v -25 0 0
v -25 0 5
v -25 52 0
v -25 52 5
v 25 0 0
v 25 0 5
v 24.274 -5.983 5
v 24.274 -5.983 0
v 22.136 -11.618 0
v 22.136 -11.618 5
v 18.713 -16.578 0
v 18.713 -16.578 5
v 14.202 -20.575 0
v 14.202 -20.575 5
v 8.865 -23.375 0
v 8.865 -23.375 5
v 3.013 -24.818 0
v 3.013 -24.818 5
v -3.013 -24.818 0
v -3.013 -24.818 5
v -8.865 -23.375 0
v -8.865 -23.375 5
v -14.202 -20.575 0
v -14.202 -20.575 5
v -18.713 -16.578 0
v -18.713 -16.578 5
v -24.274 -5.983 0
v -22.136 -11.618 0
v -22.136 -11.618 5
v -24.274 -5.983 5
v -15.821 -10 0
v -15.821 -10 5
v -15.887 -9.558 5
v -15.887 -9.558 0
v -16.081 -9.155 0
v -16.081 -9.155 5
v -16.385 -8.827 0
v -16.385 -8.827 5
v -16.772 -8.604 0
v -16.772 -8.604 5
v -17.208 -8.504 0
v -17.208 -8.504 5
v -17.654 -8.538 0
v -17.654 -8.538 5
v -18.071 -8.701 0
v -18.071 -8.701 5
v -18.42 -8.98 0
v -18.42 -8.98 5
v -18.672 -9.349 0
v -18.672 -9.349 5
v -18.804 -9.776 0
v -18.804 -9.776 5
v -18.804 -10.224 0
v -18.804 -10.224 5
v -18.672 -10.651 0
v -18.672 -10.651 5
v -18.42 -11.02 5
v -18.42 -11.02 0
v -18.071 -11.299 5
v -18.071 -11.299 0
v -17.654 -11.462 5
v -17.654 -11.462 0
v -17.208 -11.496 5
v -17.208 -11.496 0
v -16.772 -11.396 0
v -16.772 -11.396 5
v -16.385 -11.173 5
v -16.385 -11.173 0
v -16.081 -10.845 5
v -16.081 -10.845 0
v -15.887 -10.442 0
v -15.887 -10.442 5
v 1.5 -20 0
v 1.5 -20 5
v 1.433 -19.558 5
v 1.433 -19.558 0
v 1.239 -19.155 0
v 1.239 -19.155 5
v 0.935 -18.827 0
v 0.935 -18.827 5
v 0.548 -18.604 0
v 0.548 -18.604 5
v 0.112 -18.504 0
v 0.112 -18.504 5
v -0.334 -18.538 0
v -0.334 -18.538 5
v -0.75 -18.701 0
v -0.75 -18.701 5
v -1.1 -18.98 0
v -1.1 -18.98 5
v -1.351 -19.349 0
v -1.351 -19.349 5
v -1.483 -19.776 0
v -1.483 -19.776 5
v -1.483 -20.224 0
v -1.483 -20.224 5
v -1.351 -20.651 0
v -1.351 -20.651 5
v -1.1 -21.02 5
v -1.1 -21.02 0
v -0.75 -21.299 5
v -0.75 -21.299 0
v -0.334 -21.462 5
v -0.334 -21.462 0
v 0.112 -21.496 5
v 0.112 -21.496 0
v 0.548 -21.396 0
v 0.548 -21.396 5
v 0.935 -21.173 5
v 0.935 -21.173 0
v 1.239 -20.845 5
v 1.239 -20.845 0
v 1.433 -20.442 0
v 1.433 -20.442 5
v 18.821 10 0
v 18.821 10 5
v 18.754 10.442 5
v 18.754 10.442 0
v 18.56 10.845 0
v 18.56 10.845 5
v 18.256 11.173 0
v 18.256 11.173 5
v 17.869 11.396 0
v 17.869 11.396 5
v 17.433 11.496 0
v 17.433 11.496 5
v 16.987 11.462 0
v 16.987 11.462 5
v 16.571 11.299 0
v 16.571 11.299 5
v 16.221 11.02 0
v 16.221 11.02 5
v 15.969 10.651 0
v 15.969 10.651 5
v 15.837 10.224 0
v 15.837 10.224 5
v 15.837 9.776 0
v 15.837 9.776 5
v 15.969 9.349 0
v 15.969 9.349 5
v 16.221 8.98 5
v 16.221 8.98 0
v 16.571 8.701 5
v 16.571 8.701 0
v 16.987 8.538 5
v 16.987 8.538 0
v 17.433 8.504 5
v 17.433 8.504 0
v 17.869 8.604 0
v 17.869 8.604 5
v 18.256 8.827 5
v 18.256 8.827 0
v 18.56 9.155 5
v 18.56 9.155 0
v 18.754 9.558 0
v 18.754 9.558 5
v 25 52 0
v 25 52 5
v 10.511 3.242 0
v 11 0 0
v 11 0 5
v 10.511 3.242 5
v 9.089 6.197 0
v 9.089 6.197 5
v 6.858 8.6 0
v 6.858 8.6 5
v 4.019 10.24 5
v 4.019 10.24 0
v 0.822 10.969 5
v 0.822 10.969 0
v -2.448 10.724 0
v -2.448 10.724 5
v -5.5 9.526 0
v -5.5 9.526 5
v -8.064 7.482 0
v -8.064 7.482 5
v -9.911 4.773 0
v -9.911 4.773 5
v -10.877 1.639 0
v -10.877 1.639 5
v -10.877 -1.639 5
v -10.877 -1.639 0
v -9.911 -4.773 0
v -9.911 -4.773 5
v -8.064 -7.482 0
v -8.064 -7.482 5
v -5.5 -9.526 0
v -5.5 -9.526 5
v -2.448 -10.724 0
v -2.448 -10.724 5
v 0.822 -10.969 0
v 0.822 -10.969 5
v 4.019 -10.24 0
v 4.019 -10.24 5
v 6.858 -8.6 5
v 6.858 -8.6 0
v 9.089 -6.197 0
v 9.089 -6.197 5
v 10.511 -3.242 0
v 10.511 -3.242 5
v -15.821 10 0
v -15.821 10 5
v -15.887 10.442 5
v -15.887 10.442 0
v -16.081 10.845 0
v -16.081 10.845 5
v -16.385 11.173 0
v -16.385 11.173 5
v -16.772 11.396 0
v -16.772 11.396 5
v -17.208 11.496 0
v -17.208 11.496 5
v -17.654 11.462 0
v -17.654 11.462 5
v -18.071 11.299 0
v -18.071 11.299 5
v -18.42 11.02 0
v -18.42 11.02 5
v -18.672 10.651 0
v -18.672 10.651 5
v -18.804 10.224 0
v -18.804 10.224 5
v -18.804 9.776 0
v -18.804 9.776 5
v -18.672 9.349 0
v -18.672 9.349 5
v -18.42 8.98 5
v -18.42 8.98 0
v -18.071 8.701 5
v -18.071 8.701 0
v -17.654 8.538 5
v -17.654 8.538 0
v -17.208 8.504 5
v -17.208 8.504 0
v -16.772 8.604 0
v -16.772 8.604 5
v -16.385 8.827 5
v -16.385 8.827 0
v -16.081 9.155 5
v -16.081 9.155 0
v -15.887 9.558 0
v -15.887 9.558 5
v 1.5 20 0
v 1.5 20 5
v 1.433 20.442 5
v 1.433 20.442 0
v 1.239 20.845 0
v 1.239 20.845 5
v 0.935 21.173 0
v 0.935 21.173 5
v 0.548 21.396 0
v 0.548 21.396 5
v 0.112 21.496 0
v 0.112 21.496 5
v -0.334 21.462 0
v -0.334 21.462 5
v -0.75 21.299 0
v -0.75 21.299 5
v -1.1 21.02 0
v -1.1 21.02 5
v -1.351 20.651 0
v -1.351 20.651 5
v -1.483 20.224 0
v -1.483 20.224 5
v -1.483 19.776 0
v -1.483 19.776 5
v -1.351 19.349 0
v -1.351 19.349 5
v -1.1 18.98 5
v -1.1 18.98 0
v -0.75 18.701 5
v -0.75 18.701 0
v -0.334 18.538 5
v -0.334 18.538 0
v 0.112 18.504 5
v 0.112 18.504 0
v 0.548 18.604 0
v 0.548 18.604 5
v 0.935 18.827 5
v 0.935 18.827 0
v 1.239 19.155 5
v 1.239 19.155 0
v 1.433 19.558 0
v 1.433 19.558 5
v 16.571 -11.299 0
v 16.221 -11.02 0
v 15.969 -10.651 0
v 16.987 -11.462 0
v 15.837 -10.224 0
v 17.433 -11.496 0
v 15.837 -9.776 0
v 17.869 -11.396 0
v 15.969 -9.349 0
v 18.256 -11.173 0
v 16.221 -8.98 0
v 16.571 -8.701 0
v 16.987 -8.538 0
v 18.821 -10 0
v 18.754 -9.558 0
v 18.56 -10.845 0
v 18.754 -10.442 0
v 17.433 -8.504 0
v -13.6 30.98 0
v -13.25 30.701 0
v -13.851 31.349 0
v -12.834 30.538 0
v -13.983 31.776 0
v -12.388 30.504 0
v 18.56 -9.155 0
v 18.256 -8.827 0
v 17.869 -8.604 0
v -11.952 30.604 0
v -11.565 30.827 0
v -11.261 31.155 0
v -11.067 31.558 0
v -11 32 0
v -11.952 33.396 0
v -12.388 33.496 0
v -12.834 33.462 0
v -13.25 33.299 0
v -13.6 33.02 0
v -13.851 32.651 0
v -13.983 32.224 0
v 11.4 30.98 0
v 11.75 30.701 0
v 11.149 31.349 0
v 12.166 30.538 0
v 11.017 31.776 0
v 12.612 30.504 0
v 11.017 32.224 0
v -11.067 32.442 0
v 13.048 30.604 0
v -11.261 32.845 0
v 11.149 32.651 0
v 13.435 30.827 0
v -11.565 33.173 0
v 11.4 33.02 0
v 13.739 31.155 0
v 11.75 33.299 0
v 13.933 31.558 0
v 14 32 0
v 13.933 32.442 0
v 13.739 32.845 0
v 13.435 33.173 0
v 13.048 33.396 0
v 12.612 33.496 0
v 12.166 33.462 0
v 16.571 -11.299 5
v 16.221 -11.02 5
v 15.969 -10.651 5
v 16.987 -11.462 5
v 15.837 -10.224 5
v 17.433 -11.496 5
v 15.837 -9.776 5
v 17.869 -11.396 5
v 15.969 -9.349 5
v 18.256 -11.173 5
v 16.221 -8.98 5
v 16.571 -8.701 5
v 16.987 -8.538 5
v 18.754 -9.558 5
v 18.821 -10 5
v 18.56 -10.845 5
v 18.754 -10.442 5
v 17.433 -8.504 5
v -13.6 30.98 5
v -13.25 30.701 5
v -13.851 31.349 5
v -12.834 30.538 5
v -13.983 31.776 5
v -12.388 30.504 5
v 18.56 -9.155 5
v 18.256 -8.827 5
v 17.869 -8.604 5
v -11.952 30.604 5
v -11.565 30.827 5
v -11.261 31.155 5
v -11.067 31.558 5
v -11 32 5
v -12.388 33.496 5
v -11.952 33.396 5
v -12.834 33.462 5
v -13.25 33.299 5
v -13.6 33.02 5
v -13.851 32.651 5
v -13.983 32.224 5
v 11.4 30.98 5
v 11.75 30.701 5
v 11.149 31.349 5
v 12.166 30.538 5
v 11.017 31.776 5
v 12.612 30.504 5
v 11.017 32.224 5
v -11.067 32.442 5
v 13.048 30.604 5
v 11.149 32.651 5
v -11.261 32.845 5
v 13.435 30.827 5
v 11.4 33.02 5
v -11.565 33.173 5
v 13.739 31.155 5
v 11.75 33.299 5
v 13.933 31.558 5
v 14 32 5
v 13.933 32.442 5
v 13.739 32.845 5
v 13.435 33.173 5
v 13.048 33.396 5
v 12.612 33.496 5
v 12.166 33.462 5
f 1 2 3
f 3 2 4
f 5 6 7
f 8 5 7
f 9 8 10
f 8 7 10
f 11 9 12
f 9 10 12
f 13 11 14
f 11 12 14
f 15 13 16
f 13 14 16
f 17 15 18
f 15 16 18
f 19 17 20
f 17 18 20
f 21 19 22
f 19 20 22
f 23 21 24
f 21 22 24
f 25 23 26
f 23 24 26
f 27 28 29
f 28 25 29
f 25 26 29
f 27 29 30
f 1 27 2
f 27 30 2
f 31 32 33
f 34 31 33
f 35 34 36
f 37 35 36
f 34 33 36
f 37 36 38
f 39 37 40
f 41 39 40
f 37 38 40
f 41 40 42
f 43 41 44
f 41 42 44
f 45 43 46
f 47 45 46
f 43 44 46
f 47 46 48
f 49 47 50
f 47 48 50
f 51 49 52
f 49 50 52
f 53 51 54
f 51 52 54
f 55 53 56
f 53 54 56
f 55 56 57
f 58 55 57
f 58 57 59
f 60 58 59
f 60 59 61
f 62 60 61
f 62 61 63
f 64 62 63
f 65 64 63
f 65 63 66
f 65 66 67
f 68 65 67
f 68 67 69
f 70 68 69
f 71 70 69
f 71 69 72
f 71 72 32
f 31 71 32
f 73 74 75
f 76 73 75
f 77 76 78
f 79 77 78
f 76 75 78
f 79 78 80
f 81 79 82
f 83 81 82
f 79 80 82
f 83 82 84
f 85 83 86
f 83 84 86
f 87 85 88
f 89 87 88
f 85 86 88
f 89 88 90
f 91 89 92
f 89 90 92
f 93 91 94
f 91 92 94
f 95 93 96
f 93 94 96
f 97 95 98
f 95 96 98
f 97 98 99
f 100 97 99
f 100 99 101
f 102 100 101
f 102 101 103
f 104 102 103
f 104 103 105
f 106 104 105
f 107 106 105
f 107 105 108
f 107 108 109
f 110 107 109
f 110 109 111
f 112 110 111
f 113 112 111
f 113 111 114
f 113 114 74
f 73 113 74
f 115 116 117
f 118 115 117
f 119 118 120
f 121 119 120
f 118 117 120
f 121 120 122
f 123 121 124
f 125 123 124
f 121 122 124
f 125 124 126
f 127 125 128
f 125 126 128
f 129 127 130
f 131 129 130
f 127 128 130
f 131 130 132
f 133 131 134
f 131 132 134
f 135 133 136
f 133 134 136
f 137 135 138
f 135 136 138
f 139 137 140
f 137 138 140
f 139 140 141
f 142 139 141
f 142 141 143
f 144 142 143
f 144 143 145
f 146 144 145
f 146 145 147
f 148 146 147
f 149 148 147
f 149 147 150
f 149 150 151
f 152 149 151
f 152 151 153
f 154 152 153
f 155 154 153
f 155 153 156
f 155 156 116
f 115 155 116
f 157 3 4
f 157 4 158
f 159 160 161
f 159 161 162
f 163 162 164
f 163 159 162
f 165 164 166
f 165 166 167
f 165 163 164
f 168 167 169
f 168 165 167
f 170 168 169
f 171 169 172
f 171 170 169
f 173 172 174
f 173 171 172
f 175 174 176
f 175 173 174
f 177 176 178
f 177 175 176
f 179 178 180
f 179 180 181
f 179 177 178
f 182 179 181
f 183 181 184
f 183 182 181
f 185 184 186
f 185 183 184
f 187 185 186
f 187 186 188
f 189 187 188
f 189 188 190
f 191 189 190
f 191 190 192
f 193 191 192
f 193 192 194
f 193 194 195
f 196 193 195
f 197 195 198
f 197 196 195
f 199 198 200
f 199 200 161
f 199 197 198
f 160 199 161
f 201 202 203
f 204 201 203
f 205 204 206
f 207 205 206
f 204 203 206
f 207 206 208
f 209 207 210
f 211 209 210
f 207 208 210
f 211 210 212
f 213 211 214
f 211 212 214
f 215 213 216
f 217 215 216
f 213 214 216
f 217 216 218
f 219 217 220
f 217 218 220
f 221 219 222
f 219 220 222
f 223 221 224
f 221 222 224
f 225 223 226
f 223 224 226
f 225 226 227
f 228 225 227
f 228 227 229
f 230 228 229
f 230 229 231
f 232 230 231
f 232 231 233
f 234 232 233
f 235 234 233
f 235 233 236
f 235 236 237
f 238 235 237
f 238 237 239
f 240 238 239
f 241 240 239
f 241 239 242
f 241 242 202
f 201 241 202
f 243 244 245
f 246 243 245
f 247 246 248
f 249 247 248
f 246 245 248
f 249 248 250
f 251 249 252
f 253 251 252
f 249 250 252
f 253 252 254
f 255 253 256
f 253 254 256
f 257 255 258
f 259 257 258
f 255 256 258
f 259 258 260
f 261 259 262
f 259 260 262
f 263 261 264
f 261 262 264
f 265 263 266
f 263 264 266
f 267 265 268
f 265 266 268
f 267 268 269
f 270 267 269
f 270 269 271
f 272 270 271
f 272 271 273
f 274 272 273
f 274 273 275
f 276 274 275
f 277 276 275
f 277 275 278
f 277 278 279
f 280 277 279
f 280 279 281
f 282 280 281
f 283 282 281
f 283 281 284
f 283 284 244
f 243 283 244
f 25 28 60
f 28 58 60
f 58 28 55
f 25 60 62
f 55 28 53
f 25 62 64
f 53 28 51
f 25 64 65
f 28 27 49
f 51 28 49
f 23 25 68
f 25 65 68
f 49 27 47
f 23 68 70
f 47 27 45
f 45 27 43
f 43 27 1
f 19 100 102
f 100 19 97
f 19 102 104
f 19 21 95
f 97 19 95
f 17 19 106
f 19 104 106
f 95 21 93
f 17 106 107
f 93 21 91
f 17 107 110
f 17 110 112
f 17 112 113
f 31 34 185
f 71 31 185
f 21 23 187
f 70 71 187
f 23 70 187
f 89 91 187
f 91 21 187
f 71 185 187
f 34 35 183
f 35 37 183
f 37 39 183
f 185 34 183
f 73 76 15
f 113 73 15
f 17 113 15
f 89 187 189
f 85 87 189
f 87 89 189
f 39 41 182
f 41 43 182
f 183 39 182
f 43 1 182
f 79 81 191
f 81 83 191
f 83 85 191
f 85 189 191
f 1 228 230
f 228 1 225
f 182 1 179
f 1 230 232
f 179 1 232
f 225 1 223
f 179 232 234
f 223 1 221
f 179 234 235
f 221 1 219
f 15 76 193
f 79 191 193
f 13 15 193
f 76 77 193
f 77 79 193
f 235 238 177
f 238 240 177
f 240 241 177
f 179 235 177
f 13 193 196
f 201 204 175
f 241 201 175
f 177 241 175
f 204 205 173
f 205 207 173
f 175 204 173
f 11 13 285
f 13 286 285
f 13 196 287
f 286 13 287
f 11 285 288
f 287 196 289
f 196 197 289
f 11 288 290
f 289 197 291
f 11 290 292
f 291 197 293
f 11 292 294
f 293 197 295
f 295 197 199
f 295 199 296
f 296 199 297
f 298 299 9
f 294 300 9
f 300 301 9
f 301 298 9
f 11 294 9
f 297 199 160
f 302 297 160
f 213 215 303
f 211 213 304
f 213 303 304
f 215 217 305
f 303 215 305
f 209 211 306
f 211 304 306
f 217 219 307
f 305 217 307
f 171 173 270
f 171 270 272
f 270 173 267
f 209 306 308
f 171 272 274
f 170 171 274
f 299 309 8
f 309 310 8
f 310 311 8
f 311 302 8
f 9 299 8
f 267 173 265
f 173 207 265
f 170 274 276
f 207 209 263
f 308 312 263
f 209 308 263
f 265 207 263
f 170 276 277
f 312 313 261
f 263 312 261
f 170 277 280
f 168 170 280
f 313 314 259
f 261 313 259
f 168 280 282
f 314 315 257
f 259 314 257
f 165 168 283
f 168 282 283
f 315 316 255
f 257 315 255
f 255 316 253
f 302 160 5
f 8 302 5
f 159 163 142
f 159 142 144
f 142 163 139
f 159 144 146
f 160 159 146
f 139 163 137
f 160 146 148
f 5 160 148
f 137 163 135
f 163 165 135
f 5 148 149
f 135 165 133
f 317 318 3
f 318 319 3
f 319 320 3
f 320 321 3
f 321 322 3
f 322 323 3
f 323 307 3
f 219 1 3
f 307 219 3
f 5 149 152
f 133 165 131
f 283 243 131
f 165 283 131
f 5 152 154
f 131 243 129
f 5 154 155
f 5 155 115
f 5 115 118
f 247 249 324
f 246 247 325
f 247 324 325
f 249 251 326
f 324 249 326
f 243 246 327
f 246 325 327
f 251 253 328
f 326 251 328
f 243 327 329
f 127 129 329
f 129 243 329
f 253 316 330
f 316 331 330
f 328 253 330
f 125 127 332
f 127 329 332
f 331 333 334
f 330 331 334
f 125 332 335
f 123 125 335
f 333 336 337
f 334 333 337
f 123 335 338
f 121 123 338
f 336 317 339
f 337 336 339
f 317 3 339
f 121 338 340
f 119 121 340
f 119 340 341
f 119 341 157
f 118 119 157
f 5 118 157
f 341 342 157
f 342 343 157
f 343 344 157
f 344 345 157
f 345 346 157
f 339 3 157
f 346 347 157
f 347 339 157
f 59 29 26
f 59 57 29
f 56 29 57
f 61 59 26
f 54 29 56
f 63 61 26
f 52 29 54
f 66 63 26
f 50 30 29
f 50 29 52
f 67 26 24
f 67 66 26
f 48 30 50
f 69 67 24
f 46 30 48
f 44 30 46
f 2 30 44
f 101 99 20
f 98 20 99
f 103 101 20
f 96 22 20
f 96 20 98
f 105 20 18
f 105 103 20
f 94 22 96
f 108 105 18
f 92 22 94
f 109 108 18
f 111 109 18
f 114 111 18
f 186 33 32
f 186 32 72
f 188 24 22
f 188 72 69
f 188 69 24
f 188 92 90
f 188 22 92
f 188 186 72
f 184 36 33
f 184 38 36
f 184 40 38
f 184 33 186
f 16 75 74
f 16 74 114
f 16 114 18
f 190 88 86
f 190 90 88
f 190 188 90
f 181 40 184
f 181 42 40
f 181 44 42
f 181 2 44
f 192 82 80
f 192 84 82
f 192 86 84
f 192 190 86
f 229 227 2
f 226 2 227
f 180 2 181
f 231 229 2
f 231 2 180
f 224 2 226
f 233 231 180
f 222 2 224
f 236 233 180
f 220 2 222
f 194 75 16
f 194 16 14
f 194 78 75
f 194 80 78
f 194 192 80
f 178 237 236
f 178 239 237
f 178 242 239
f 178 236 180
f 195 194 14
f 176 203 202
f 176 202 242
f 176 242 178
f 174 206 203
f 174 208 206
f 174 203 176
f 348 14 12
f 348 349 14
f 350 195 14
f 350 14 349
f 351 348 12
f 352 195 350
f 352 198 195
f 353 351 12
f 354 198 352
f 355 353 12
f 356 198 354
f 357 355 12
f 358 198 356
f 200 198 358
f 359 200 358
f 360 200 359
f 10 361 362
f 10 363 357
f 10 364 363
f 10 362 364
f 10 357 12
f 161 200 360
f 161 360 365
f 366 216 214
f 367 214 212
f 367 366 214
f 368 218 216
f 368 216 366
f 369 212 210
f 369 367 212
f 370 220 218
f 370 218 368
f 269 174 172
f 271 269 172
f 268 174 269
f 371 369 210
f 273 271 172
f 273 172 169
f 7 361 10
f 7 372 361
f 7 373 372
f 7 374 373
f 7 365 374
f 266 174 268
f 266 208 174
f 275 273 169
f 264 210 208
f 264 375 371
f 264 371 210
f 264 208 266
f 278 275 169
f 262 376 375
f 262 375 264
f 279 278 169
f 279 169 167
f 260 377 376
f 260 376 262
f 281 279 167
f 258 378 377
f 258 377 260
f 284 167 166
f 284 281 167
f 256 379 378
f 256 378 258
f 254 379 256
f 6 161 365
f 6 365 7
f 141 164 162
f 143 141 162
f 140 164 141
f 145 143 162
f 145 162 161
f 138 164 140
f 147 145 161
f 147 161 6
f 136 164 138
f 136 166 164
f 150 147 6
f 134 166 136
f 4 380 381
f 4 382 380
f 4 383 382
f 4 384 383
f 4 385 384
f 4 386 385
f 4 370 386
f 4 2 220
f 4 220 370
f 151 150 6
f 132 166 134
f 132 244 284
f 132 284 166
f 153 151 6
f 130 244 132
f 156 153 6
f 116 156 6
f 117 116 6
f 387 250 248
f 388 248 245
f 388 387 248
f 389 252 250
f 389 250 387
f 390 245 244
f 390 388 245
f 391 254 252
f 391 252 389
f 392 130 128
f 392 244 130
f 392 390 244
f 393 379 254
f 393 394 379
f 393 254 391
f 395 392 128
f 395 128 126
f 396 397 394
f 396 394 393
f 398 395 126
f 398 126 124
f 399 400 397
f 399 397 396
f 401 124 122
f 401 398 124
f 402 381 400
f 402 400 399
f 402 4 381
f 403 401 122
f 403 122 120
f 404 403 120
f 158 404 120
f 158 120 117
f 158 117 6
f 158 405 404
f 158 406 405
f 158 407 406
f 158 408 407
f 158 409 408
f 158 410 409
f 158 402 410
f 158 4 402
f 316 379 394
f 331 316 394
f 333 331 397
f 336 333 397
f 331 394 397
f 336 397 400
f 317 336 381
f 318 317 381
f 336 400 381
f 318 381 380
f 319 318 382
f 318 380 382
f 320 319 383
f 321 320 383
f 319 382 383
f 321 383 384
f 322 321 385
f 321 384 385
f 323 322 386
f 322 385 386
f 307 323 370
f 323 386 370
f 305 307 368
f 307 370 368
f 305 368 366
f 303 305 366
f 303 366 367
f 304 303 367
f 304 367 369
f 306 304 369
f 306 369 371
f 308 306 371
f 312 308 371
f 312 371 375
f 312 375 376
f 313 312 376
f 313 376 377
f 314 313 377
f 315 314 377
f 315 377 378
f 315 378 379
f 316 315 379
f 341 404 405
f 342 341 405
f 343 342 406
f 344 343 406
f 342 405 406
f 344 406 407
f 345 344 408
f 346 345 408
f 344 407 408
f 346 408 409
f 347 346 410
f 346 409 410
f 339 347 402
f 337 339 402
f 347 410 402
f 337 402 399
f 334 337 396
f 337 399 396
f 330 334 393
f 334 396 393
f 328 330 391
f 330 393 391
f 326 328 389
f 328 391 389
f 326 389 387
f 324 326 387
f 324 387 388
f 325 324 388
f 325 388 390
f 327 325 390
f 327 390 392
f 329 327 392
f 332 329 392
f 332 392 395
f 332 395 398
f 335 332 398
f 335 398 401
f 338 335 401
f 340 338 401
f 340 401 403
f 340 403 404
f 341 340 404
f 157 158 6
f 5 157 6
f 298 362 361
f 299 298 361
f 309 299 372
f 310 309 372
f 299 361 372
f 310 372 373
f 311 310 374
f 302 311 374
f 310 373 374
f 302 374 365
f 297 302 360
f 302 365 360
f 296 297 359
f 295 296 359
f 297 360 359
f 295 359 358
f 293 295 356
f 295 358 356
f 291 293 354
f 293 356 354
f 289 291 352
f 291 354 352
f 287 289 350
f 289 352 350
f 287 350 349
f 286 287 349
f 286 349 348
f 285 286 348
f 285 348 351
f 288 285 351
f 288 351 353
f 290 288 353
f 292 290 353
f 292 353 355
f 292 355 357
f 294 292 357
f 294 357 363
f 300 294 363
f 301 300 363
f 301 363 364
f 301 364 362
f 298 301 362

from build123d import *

# Parameters (mm, degrees)
ESQUISSE1_W             = 100
ESQUISSE1_H             = 100.548113933
ESQUISSE1_R             = 11
BOSS_EXTRU_1_DEPTH      = 5
ESQUISSE2_R             = 1.5
ENL_V_MAT_EXTRU_1_DEPTH = 73.311824759


with BuildPart() as part:
    # Esquisse1 → Boss.-Extru.1 (new body)
    with BuildSketch(Plane.XY):
        with Locations((0, 1.725943033)):
            Rectangle(ESQUISSE1_W, ESQUISSE1_H)
        Circle(ESQUISSE1_R, mode=Mode.SUBTRACT)
    extrude(amount=BOSS_EXTRU_1_DEPTH)

    # Esquisse2 → Enlèv. mat.-Extru.1 (cut, through all)
    with BuildSketch(Plane.XY.offset(5)):
        with BuildLine():
            Line((25, 52), (25, 0))
            ThreePointArc((25, 0), (0, -25), (-25, 0))
            Line((-25, 0), (-25, 52))
            Line((-25, 52), (-50, 52))
            Line((-50, 52), (-50, -48.548113933))
            Line((-50, -48.548113933), (50, -48.548113933))
            Line((50, -48.548113933), (50, 52))
            Line((50, 52), (25, 52))
        make_face()
        with Locations((0, 20)):
            Circle(ESQUISSE2_R)
        with Locations((17.320508076, 10)):
            Circle(ESQUISSE2_R)
        with Locations((17.320508076, -10)):
            Circle(ESQUISSE2_R)
        with Locations((0, -20)):
            Circle(ESQUISSE2_R)
        with Locations((-17.320508076, -10)):
            Circle(ESQUISSE2_R)
        with Locations((-17.320508076, 10)):
            Circle(ESQUISSE2_R)
        with Locations((-12.5, 32)):
            Circle(ESQUISSE2_R)
        with Locations((12.5, 32)):
            Circle(ESQUISSE2_R)
    extrude(amount=-ENL_V_MAT_EXTRU_1_DEPTH, mode=Mode.SUBTRACT)


solid = part.part
